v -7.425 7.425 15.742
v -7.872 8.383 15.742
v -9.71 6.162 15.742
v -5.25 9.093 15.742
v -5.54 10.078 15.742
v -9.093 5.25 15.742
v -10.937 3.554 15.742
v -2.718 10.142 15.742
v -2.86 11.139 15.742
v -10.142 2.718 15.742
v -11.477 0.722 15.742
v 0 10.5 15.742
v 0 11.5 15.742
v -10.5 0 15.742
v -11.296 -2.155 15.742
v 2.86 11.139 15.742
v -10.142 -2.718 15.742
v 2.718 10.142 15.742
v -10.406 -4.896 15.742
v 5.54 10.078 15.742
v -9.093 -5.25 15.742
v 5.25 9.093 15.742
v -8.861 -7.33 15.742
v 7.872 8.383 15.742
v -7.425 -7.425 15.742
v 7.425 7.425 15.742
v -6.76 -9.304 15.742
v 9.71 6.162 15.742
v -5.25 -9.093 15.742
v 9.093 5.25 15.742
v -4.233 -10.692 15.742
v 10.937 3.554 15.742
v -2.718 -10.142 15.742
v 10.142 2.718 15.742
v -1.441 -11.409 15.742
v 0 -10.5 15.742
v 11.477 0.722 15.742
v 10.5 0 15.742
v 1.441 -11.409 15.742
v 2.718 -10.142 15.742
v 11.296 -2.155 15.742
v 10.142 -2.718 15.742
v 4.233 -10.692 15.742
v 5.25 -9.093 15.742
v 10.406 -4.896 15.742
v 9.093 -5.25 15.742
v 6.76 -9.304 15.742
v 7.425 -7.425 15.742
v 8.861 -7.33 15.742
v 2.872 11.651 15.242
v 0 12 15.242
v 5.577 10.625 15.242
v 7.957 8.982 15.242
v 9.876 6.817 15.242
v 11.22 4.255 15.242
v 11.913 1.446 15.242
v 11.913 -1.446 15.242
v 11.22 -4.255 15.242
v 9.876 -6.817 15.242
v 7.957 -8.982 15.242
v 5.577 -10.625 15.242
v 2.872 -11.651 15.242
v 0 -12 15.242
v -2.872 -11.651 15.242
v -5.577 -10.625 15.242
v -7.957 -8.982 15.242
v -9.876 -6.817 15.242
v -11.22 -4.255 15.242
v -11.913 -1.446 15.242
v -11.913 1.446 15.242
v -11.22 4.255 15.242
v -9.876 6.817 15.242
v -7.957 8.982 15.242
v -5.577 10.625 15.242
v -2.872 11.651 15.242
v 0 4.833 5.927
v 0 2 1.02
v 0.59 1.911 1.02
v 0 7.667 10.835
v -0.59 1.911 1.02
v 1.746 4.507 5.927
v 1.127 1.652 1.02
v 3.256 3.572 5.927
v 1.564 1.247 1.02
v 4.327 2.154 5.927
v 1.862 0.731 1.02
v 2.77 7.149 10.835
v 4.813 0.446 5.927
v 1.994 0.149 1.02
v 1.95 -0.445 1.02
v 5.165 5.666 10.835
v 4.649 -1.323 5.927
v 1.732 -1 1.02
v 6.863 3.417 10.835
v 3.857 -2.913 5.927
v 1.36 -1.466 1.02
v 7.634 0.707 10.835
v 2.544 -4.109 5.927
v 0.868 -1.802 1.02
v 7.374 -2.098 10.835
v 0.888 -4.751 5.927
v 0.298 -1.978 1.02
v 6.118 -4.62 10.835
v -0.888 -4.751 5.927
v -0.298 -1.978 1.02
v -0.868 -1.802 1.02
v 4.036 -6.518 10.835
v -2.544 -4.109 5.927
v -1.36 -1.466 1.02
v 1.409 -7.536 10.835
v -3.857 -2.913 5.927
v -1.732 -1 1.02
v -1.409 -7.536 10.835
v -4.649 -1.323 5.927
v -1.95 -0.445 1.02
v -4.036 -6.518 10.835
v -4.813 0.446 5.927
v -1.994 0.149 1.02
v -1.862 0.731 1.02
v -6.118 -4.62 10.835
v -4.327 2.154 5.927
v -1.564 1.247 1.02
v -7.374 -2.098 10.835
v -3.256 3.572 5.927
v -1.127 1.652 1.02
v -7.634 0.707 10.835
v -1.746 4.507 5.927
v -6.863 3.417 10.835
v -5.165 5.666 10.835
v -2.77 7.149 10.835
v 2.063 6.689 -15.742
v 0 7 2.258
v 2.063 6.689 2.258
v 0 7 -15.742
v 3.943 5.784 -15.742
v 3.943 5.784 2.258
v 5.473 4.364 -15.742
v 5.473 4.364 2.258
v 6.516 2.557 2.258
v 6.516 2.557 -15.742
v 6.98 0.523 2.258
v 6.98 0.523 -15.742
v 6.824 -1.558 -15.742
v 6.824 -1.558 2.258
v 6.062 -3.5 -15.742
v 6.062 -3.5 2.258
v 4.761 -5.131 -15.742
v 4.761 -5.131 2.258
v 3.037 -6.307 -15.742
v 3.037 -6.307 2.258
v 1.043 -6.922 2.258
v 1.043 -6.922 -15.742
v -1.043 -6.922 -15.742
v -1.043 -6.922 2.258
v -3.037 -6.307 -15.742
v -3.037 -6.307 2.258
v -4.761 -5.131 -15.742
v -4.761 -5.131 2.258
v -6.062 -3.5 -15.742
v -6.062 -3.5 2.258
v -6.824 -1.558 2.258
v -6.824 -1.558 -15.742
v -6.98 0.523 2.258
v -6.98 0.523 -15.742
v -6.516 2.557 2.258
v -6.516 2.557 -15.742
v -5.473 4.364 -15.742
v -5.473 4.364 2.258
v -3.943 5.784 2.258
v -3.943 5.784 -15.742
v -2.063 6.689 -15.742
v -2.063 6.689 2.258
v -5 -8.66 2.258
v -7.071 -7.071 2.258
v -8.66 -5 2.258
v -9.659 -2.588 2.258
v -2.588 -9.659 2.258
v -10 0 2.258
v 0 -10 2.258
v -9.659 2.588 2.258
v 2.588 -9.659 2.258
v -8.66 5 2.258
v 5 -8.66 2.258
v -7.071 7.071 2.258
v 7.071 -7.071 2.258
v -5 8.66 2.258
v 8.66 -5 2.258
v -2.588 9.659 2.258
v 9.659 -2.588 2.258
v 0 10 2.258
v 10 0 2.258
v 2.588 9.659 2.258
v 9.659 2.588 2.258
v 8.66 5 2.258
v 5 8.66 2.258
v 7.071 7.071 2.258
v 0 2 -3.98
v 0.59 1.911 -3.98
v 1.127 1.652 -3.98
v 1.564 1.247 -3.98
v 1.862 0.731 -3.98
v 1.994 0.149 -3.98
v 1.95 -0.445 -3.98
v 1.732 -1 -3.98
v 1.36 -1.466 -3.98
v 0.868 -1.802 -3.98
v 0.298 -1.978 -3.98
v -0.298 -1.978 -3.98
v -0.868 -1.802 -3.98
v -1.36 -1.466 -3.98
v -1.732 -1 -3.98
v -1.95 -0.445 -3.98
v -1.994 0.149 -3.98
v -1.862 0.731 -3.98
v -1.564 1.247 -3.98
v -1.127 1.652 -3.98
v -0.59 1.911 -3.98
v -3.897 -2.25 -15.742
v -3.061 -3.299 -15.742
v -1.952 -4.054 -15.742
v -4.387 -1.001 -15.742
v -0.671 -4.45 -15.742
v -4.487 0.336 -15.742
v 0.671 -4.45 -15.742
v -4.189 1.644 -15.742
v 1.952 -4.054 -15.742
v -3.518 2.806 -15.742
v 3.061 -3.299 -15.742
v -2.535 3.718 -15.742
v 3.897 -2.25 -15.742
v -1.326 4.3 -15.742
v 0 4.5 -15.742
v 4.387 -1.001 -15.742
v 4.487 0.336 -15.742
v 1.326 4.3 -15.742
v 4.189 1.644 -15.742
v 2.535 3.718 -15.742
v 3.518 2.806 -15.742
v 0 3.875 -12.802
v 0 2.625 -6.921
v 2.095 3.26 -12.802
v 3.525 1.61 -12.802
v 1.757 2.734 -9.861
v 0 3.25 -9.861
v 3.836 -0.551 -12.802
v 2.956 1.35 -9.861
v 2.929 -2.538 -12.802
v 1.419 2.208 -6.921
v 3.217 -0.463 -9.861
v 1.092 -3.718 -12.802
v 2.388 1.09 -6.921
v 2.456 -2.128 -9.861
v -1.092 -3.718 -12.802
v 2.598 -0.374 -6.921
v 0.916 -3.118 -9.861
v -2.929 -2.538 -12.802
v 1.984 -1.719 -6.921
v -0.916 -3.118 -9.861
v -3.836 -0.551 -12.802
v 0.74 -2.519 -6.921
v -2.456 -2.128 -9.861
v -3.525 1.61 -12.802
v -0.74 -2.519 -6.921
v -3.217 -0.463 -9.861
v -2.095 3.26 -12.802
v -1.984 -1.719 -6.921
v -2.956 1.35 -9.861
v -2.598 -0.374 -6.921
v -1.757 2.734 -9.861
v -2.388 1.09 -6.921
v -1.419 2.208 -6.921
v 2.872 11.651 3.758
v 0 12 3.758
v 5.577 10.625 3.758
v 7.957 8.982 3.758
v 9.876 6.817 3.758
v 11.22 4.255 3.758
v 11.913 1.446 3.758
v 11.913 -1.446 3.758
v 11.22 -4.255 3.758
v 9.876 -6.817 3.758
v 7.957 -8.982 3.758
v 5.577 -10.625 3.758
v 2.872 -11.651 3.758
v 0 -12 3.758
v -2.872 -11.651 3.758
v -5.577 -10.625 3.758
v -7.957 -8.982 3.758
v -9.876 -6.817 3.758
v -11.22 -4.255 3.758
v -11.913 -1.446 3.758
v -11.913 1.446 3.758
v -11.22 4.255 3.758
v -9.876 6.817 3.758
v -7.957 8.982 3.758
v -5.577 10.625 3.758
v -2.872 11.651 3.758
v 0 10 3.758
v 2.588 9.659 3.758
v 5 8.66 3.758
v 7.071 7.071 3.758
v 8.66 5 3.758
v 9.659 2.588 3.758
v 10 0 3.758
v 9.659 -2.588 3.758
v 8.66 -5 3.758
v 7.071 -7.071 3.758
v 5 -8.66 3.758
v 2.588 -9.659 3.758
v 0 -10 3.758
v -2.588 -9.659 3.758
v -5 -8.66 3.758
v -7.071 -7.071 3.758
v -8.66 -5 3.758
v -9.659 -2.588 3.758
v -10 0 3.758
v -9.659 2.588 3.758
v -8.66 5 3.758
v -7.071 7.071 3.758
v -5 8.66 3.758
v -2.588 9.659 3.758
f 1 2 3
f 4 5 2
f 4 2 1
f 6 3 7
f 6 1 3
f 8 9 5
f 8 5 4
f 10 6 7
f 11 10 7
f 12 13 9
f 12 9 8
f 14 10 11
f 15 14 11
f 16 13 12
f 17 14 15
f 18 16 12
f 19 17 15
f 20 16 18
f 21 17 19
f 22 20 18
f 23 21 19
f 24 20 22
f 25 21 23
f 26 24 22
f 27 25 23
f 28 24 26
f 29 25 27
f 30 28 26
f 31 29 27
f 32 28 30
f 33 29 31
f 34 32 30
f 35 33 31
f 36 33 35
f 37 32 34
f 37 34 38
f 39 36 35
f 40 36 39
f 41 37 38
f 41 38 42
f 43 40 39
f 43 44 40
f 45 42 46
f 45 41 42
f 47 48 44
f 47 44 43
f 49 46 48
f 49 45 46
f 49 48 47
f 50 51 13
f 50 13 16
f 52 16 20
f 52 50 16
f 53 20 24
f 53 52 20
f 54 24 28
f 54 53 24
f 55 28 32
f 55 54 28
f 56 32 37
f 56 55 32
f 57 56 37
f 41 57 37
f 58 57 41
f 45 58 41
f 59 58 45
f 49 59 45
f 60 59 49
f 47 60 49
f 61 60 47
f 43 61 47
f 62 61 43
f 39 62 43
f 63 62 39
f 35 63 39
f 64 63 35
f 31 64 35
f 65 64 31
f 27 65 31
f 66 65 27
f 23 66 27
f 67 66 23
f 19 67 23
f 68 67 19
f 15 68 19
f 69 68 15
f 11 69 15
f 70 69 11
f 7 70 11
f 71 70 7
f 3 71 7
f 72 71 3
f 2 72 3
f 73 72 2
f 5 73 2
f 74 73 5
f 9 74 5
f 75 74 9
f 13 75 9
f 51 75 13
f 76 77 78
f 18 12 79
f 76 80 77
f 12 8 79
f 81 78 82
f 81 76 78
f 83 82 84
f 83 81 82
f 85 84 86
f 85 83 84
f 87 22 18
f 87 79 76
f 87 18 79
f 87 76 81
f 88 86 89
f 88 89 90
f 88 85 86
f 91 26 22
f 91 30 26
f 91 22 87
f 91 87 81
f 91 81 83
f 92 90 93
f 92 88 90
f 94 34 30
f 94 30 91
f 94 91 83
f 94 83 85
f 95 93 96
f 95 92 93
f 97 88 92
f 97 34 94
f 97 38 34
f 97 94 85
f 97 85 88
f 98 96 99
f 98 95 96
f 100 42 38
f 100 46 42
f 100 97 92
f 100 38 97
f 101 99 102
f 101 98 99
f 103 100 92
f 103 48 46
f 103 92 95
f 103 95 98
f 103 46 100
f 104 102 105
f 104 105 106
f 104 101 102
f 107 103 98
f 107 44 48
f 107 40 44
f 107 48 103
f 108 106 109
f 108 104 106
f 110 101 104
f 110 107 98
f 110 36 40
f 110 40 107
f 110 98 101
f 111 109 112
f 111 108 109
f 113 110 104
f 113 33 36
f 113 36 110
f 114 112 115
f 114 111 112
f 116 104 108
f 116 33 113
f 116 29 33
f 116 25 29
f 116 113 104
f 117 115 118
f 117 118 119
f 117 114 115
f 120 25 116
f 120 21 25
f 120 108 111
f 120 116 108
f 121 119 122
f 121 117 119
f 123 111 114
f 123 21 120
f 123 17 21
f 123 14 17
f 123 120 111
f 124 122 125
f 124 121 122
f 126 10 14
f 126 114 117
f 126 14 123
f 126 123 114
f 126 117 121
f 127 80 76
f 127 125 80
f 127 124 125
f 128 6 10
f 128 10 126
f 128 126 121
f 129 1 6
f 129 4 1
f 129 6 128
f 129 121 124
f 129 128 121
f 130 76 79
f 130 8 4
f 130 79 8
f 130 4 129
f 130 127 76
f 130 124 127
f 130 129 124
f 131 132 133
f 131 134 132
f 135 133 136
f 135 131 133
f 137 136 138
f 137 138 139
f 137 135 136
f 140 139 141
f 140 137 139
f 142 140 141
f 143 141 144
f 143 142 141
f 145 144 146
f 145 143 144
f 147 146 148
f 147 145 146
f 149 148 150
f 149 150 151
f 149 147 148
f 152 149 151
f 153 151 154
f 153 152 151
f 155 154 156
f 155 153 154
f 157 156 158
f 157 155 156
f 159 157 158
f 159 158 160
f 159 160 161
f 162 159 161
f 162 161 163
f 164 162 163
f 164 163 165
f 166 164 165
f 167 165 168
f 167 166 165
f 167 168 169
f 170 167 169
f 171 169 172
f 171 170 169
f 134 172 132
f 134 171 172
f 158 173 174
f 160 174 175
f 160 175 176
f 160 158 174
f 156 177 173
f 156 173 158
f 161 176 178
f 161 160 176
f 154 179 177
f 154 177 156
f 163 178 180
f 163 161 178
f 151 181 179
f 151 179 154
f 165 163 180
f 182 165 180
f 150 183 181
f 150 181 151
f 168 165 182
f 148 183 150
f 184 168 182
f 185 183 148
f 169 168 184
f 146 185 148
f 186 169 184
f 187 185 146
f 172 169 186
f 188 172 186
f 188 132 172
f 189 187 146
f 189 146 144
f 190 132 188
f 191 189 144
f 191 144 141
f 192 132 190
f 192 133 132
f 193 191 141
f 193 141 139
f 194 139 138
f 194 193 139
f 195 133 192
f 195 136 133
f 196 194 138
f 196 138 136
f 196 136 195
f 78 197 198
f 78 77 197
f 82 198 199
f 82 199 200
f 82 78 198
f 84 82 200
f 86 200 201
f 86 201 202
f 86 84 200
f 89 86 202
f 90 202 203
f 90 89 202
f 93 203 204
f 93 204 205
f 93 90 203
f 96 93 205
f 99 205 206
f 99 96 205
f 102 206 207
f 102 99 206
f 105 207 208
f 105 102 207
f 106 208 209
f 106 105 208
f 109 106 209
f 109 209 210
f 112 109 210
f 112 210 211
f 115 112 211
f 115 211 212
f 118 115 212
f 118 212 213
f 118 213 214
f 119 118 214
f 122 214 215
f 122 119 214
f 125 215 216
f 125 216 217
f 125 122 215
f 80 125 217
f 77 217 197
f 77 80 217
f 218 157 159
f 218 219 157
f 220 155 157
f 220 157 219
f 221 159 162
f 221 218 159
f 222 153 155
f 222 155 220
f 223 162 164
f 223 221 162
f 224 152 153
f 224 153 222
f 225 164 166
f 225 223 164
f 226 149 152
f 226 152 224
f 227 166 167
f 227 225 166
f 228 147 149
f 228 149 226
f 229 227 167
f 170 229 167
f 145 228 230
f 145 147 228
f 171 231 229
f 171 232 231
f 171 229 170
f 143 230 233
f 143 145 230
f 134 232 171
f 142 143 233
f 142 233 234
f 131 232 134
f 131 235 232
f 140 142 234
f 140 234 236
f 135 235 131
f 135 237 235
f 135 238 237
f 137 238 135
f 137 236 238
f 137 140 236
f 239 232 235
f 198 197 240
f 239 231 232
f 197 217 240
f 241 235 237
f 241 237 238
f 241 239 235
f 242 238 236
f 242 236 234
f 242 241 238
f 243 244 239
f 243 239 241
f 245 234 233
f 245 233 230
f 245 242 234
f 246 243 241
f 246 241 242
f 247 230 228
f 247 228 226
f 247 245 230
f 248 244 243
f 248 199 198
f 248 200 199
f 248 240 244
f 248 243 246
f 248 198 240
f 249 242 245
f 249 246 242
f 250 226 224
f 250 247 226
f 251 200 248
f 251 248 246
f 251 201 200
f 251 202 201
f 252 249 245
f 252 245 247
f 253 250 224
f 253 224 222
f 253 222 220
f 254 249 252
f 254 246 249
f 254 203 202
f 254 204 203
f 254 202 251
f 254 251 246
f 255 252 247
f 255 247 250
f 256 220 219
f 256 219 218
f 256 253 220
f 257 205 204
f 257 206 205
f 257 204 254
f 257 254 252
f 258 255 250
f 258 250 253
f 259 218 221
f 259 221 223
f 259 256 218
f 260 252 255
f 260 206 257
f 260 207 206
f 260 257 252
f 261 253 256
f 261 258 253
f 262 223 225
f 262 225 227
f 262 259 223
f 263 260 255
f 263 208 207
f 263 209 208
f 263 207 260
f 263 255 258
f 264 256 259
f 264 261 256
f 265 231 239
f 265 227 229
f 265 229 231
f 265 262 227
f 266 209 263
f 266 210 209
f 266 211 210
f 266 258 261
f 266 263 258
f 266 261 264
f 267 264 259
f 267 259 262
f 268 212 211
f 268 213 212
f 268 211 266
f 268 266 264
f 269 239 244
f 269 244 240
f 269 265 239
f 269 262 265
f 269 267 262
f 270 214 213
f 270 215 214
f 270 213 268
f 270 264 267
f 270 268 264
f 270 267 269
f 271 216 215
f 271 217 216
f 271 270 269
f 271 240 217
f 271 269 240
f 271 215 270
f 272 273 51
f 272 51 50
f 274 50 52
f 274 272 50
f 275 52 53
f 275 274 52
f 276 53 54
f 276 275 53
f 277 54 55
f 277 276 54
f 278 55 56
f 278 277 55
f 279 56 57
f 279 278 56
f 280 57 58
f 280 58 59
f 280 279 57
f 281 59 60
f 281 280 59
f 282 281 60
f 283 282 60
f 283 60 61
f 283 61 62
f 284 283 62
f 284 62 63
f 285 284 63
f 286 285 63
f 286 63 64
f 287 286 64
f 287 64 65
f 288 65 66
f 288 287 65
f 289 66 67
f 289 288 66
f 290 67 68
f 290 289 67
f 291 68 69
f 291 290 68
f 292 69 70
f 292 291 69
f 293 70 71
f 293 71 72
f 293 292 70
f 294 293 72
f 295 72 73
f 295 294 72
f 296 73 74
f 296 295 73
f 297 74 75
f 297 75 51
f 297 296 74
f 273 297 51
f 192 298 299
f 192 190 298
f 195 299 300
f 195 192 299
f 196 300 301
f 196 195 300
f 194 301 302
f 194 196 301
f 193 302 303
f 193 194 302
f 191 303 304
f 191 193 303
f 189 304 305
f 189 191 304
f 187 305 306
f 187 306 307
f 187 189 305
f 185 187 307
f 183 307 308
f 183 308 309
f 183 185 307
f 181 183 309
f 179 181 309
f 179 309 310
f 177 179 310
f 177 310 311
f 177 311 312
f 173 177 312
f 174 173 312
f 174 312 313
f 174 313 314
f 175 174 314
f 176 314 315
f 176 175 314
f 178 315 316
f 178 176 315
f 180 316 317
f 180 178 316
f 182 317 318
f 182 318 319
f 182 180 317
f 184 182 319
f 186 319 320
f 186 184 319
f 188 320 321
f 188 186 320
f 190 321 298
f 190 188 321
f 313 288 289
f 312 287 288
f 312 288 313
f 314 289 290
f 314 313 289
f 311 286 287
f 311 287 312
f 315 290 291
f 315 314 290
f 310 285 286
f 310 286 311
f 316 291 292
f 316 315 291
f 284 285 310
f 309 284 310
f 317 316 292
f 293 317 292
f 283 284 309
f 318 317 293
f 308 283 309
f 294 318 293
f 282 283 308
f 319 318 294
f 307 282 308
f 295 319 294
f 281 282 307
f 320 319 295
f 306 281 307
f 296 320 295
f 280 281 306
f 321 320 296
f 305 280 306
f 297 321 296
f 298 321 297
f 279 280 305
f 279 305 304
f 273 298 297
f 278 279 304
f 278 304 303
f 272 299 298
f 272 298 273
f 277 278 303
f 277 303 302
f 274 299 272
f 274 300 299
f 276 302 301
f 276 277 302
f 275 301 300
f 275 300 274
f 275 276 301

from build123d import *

# Parameters (mm, degrees)
CHANFREIN1_SIZE = 0.5


with BuildPart() as part:
    # Esquisse1 → Révolution1 (revolve)
    with BuildSketch(Plane(origin=(0, 0, 0), x_dir=(0, 0, -1), z_dir=(1, 0, 0))):
        Polygon((15.742003569, 4.5), (3.980428295, 2), (-1.019571705, 2), (-15.742003569, 10.5), (-15.742003569, 12), (-3.757996431, 12), (-3.757996431, 10), (-2.257996431, 10), (-2.257996431, 7), (15.742003569, 7), align=None)
    revolve(axis=Axis((0, 0, 15.742003569), (0, 0, -1)))

    # Chanfrein1
    chanfrein1_edges = [part.edges().sort_by_distance(p)[0] for p in [
        (0, -12, 15.742003569),
    ]]
    chamfer(chanfrein1_edges, length=CHANFREIN1_SIZE)


solid = part.part
